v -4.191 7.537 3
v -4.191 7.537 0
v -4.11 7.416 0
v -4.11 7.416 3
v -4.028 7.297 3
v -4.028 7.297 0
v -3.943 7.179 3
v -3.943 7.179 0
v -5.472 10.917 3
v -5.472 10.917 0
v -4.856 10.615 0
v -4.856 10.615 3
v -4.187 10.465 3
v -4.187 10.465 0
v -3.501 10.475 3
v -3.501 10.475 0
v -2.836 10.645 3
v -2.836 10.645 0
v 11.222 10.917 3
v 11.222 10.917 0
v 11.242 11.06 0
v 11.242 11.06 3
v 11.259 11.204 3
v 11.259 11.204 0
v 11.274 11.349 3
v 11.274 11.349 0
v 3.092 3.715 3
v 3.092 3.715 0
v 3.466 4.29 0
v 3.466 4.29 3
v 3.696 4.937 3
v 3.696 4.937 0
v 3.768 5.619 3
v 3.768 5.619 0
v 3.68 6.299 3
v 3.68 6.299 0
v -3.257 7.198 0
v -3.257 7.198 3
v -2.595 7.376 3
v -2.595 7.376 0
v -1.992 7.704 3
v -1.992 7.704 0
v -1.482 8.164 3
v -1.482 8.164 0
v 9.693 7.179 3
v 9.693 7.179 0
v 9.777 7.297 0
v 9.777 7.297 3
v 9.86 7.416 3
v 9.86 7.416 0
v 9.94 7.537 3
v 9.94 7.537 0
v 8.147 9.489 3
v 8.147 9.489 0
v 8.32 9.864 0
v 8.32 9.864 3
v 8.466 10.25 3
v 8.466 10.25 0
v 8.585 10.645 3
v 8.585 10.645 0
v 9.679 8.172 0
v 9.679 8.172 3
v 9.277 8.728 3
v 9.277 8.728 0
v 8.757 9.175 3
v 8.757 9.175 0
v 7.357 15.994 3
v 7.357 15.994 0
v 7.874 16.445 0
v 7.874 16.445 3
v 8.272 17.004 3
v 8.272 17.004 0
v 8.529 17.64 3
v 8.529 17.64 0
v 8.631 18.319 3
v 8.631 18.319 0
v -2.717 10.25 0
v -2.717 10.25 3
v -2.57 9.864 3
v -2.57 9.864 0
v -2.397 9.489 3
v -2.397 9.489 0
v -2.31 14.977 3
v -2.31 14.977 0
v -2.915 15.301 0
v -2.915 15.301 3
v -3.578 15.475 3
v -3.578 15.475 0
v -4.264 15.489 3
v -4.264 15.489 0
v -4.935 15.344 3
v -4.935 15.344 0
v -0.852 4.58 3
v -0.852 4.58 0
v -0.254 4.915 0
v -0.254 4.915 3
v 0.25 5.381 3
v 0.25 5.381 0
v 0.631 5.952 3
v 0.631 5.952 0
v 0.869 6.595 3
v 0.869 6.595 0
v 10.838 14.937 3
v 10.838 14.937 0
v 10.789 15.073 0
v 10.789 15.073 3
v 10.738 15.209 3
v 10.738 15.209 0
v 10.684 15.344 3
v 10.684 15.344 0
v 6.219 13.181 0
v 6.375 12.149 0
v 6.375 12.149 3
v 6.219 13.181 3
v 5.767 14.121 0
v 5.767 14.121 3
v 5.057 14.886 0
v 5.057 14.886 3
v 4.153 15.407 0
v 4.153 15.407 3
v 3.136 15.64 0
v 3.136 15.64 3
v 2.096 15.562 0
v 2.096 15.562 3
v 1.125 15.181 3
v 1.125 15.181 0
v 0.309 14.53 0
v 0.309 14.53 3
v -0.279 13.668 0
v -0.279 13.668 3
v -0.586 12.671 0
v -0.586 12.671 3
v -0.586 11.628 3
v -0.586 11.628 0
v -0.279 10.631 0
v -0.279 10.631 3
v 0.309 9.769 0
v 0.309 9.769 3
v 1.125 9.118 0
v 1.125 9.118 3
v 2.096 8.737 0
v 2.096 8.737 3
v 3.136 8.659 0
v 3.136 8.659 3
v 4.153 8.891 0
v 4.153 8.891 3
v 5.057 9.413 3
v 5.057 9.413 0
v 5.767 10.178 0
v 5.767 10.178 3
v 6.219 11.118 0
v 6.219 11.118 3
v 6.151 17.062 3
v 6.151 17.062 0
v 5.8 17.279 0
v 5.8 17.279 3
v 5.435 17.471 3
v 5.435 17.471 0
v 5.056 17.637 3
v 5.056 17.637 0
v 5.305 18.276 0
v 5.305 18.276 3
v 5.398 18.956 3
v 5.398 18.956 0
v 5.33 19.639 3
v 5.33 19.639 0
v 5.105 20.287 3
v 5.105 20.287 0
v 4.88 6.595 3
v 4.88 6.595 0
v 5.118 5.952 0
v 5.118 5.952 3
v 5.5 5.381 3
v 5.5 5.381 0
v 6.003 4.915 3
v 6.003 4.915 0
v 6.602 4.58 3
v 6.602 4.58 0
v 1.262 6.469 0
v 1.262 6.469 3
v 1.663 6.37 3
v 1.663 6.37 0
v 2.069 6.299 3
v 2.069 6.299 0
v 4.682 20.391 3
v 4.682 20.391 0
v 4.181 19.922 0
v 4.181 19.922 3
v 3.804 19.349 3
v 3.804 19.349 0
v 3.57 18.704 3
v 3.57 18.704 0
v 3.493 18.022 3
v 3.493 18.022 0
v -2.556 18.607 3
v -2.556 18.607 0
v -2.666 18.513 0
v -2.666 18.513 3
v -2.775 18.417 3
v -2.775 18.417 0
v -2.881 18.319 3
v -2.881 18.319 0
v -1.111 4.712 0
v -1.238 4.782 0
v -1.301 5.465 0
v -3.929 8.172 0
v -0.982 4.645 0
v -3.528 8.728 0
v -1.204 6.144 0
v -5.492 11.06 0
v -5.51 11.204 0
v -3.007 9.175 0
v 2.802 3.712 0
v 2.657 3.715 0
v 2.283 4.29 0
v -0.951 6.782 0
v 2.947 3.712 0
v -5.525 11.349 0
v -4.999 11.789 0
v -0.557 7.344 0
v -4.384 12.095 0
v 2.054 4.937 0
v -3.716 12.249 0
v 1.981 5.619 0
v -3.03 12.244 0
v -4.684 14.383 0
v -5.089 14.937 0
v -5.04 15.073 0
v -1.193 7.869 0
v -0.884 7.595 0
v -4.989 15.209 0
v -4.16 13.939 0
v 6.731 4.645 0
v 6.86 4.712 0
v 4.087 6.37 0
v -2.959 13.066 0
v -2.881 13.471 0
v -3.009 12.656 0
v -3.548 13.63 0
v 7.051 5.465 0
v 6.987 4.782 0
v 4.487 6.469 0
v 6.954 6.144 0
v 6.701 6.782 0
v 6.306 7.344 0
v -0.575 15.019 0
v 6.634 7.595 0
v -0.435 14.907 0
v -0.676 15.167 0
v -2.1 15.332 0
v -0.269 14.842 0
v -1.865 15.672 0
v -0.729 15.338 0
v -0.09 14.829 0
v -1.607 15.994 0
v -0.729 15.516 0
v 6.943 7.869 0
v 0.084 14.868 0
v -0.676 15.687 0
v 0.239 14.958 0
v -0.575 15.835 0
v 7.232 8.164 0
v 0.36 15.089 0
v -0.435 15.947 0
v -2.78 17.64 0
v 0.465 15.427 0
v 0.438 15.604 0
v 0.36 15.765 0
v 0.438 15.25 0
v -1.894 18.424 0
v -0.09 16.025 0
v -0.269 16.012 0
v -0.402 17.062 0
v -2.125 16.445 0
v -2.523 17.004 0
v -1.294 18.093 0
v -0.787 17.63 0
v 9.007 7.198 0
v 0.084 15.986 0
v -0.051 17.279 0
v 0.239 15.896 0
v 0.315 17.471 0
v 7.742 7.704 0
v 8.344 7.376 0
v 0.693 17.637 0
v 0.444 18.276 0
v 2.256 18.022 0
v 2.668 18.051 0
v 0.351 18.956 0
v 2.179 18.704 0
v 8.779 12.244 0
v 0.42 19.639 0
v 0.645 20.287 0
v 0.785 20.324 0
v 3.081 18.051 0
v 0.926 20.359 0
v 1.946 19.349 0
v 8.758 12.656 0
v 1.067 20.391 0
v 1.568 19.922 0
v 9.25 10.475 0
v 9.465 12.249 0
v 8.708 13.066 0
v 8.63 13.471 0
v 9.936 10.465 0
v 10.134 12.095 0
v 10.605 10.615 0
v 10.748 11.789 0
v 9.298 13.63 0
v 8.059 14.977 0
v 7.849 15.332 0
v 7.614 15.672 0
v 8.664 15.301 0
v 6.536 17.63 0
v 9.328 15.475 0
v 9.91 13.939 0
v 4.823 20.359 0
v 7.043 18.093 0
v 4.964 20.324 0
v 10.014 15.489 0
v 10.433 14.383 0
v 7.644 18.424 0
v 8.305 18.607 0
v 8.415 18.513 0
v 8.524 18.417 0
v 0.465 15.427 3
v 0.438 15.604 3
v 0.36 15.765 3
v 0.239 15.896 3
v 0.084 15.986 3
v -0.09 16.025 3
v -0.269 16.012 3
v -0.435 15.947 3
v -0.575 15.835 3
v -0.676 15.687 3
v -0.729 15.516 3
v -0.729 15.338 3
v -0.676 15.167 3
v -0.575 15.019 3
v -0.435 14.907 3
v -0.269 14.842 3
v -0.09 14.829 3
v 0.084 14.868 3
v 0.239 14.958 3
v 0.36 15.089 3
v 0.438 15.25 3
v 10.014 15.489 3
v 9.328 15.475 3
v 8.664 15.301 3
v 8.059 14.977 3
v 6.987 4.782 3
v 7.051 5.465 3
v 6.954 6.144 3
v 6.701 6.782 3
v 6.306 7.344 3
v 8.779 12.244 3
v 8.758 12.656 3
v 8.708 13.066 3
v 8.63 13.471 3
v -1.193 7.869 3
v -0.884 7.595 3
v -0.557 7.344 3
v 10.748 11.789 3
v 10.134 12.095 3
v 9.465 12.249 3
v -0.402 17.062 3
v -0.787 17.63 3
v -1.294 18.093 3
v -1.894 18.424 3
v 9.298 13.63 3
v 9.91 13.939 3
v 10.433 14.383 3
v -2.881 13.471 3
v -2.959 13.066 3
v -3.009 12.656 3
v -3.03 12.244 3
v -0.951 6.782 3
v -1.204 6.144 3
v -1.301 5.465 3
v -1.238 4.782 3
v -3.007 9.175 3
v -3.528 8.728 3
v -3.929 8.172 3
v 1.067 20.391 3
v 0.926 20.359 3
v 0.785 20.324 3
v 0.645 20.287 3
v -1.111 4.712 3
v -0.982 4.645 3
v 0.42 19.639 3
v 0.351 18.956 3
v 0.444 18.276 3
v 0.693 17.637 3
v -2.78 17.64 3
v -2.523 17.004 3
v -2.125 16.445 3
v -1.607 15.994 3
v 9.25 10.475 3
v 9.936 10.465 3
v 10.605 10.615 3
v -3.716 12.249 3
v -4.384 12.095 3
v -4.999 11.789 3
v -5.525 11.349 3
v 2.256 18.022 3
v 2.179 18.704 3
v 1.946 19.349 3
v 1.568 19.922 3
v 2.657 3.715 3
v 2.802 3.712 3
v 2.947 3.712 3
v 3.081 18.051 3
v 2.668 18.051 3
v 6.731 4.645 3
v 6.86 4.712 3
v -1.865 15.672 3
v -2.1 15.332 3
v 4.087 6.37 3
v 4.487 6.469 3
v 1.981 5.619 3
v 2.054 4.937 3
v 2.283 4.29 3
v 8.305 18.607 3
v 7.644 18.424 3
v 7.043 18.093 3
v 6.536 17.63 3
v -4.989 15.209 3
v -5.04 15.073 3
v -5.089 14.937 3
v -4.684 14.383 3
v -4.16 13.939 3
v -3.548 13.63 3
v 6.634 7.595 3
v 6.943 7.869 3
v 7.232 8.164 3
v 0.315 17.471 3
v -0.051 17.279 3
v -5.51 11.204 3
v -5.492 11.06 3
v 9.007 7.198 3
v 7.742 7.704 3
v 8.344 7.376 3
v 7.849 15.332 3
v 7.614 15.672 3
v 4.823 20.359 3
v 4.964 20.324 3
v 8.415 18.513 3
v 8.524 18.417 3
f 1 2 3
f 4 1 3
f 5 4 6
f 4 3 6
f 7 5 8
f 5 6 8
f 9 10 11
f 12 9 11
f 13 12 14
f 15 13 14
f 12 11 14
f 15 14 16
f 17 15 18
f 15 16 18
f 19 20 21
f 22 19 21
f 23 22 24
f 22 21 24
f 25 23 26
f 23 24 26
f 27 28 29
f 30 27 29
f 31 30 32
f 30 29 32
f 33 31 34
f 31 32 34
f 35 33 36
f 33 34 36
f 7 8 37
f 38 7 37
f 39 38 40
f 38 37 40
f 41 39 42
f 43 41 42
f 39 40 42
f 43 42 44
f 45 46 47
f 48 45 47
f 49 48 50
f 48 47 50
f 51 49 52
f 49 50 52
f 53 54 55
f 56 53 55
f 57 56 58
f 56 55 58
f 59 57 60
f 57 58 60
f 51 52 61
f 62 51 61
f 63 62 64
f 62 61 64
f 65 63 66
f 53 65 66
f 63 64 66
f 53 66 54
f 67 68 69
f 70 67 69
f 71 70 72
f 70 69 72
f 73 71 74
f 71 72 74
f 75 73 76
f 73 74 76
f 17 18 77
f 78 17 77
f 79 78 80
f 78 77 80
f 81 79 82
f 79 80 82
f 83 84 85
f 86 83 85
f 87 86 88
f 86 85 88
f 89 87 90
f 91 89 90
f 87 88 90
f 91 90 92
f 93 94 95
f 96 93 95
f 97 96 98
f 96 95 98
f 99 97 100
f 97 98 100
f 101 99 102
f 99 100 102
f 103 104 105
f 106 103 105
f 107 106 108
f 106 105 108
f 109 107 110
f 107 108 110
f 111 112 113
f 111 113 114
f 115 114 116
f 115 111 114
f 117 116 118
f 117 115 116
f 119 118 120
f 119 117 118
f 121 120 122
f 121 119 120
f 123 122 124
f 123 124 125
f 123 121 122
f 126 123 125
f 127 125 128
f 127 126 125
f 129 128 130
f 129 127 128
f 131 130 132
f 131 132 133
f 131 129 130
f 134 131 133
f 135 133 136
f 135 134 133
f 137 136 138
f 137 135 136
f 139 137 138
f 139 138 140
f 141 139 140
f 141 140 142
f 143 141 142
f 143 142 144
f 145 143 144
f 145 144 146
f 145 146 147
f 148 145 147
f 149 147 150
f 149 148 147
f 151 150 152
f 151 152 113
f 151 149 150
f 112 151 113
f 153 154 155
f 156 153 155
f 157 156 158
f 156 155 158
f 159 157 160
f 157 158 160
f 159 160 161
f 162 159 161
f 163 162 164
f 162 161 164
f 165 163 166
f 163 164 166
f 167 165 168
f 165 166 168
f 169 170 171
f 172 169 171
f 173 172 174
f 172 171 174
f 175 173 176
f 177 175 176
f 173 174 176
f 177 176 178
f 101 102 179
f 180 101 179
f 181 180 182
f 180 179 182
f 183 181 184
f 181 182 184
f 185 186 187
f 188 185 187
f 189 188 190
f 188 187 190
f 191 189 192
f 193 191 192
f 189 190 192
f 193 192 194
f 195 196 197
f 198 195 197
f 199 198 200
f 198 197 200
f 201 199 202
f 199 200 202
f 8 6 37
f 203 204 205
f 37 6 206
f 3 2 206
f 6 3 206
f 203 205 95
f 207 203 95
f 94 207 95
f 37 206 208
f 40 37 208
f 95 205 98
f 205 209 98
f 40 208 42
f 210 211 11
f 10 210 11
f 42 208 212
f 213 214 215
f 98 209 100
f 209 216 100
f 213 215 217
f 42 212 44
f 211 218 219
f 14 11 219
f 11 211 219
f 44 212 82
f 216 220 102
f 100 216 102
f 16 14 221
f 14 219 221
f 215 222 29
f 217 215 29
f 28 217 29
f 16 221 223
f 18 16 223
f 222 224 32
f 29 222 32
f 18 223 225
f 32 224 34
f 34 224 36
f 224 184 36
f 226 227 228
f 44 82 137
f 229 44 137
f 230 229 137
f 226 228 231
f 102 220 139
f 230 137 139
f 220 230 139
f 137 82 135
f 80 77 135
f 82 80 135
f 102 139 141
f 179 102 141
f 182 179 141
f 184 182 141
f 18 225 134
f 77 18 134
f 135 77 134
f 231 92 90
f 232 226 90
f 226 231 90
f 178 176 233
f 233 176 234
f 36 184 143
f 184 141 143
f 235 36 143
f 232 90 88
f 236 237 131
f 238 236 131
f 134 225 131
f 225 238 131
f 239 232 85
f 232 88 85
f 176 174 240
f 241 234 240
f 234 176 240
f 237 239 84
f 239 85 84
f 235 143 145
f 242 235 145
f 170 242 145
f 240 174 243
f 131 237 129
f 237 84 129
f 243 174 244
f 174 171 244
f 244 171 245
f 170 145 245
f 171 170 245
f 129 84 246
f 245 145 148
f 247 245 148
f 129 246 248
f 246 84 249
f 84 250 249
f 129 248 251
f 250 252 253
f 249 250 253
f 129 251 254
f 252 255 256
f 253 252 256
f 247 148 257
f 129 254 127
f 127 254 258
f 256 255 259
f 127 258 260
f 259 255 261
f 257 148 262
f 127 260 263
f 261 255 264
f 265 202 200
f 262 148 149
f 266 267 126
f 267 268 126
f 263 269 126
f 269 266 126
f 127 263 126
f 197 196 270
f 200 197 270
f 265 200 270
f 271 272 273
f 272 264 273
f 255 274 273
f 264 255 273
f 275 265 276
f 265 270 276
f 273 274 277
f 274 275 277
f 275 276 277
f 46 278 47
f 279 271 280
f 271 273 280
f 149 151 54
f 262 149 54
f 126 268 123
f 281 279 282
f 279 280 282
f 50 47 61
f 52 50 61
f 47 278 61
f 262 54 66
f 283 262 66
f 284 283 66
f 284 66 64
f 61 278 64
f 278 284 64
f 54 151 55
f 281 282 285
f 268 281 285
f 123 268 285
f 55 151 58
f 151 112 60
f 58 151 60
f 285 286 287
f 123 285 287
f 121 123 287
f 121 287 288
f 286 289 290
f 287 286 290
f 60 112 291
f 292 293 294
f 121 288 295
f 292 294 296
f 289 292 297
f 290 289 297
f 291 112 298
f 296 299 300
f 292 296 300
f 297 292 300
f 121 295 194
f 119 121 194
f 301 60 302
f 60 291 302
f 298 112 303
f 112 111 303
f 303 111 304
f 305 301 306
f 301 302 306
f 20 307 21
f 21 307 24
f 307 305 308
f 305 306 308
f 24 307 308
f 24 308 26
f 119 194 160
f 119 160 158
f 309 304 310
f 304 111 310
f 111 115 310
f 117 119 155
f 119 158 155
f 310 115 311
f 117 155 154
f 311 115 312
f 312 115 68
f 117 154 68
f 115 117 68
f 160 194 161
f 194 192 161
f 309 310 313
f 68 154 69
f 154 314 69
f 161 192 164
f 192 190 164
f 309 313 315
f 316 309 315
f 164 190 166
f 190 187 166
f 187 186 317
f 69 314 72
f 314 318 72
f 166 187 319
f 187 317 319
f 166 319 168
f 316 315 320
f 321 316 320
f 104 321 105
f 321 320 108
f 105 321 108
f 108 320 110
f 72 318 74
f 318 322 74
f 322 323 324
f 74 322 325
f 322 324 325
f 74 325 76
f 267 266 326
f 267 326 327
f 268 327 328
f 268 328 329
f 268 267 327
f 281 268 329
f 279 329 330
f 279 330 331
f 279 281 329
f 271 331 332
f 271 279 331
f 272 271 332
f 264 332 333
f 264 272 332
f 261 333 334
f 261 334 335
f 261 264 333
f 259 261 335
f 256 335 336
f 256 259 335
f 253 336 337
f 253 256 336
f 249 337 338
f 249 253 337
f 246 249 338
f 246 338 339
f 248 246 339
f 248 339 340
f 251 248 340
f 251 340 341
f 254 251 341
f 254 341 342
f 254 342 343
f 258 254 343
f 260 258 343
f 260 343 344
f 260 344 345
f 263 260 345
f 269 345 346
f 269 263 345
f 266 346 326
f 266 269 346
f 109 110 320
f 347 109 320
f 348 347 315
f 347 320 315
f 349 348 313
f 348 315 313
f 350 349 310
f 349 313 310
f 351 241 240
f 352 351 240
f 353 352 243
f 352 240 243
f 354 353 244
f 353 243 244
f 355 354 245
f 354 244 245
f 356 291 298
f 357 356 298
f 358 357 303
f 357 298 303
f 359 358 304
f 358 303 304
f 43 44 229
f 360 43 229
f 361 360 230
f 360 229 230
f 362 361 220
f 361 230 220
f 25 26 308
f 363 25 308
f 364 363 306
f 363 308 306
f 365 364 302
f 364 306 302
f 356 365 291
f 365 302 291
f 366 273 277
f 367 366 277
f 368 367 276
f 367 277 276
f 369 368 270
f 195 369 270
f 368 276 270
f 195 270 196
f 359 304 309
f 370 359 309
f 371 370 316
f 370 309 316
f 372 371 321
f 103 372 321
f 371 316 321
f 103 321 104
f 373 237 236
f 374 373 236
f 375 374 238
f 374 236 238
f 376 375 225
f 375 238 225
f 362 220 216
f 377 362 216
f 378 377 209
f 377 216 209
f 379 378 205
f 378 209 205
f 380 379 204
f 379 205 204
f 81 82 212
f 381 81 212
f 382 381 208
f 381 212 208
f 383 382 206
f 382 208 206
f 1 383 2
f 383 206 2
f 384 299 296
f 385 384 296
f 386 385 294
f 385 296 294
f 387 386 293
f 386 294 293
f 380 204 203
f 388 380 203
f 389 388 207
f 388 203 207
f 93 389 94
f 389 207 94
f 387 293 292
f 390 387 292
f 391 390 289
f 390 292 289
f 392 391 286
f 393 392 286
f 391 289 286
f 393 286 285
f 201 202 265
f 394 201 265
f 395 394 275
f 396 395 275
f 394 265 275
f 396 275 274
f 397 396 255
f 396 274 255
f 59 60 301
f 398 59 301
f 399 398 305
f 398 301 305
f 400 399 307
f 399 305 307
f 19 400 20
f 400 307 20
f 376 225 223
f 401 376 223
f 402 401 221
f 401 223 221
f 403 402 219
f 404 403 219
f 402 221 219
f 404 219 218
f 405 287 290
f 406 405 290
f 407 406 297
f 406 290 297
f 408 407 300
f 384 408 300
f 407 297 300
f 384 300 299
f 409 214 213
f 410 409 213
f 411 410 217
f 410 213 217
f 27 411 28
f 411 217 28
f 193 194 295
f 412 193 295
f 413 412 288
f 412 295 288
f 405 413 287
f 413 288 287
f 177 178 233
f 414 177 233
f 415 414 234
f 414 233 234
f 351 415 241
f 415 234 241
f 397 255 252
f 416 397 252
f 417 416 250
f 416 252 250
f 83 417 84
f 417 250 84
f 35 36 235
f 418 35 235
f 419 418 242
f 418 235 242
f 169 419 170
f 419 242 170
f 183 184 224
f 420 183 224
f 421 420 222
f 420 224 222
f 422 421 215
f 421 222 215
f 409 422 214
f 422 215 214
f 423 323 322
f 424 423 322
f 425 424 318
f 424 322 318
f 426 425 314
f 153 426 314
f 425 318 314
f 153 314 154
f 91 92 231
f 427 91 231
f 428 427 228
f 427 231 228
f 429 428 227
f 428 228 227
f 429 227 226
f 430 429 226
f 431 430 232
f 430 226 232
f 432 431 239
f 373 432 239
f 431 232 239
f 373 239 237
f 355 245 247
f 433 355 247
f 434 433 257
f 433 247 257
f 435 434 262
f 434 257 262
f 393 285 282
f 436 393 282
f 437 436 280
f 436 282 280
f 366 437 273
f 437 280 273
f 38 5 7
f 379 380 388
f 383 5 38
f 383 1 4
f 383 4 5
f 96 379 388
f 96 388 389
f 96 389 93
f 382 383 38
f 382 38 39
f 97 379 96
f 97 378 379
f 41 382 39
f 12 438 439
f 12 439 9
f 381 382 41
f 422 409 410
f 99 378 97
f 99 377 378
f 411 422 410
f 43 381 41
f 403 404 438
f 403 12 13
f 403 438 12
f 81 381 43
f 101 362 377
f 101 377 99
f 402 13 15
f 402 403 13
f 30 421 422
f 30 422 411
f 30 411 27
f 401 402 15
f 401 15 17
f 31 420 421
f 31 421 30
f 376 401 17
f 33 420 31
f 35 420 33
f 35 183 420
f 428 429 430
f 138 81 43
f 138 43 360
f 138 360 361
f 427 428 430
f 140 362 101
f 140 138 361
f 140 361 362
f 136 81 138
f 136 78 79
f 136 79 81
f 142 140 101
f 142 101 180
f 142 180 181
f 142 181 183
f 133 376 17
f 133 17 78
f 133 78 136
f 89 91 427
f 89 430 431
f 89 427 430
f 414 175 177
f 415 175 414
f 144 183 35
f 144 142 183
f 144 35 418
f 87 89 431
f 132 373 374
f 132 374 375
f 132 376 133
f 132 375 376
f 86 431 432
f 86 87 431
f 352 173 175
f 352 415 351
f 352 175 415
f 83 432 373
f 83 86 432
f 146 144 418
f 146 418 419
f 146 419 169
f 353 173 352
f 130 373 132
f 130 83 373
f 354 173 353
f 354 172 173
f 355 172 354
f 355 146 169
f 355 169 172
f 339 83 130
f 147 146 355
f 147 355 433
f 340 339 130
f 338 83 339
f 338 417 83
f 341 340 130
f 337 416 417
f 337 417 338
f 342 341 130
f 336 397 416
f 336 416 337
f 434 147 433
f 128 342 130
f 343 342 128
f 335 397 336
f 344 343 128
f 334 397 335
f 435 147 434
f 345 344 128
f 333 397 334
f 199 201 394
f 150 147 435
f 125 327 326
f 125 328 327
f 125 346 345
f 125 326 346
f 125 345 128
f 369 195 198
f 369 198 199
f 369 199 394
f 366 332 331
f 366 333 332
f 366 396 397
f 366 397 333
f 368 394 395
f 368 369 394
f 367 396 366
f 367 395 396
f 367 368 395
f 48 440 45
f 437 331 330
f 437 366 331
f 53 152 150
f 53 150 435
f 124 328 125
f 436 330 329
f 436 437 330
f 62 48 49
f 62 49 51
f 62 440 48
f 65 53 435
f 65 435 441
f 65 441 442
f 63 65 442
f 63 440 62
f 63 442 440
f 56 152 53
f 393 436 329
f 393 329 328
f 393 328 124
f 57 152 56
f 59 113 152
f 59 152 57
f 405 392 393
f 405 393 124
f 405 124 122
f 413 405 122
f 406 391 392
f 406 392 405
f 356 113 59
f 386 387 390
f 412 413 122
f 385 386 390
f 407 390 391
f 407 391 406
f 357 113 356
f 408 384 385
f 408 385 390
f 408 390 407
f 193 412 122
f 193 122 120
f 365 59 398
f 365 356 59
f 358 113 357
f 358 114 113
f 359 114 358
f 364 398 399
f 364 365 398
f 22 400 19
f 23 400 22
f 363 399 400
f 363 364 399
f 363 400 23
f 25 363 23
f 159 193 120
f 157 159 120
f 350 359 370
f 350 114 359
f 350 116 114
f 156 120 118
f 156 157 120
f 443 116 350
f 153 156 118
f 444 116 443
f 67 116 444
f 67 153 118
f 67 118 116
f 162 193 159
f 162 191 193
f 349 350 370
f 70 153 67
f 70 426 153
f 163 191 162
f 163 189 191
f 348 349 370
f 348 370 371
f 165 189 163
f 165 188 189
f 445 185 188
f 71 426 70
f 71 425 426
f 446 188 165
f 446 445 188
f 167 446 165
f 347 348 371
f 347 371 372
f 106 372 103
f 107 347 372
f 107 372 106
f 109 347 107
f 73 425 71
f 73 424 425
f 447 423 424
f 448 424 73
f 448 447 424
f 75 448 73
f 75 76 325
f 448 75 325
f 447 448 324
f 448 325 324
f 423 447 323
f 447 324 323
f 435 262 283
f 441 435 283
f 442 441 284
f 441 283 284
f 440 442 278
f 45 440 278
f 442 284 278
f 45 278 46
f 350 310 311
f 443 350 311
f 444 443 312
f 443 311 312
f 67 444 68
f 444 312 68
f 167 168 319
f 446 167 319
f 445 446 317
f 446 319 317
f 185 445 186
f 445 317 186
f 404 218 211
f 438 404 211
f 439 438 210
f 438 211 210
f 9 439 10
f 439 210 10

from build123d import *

# Parameters (mm, degrees)
SKETCH1_R           = 3.5
SKETCH1_R_2         = 0.6
BOSS_EXTRUDE1_DEPTH = 3


with BuildPart() as part:
    # Sketch1 → Boss-Extrude1 (new body)
    with BuildSketch(Plane.XY):
        with BuildLine():
            ThreePointArc((2.256436303, 18.02221908), (1.945672304, 19.349065897), (1.067466411, 20.391107713))
            ThreePointArc((1.067466411, 20.391107713), (0.855450056, 20.341742586), (0.644777778, 20.286924322))
            ThreePointArc((0.644777778, 20.286924322), (0.351426057, 18.956119489), (0.692874662, 17.636835748))
            ThreePointArc((0.692874662, 17.636835748), (0.130369461, 17.378260197), (-0.40197342, 17.062215148))
            ThreePointArc((-0.40197342, 17.062215148), (-1.293757737, 18.092660425), (-2.555631415, 18.607220002))
            ThreePointArc((-2.555631415, 18.607220002), (-2.720421456, 18.464980439), (-2.881487176, 18.318536988))
            ThreePointArc((-2.881487176, 18.318536988), (-2.522781382, 17.003840487), (-1.607341932, 15.994351828))
            ThreePointArc((-1.607341932, 15.994351828), (-1.985249501, 15.503985347), (-2.309742255, 14.976749281))
            ThreePointArc((-2.309742255, 14.976749281), (-3.57824985, 15.474730425), (-4.93471126, 15.343928364))
            ThreePointArc((-4.93471126, 15.343928364), (-5.014523575, 15.141399736), (-5.089084522, 14.936879527))
            ThreePointArc((-5.089084522, 14.936879527), (-4.160496386, 13.939472483), (-2.880782238, 13.471040593))
            ThreePointArc((-2.880782238, 13.471040593), (-2.987518106, 12.861220233), (-3.029823353, 12.243576579))
            ThreePointArc((-3.029823353, 12.243576579), (-4.384454423, 12.09501211), (-5.524754604, 11.348813588))
            ThreePointArc((-5.524754604, 11.348813588), (-5.501305152, 11.132392762), (-5.472280312, 10.916648911))
            ThreePointArc((-5.472280312, 10.916648911), (-4.186538186, 10.465025257), (-2.835716429, 10.644962236))
            ThreePointArc((-2.835716429, 10.644962236), (-2.646828694, 10.055390493), (-2.397254812, 9.488833969))
            ThreePointArc((-2.397254812, 9.488833969), (-3.527679704, 8.727758217), (-4.190589627, 7.537108322))
            ThreePointArc((-4.190589627, 7.537108322), (-4.069250395, 7.356374701), (-3.943289009, 7.178831524))
            ThreePointArc((-3.943289009, 7.178831524), (-2.594940919, 7.376452797), (-1.482468538, 8.163537251))
            ThreePointArc((-1.482468538, 8.163537251), (-1.041229104, 7.729277906), (-0.556950462, 7.343599785))
            ThreePointArc((-0.556950462, 7.343599785), (-1.204202457, 6.144366032), (-1.237857446, 4.782028306))
            ThreePointArc((-1.237857446, 4.782028306), (-1.046425791, 4.678385785), (-0.852384094, 4.579716284))
            ThreePointArc((-0.852384094, 4.579716284), (0.249679662, 5.381309833), (0.868948651, 6.595230199))
            ThreePointArc((0.868948651, 6.595230199), (1.461457147, 6.415766834), (2.069498148, 6.299321325))
            ThreePointArc((2.069498148, 6.299321325), (2.053696683, 4.936659572), (2.657006579, 3.714729171))
            ThreePointArc((2.657006579, 3.714729171), (2.874675973, 3.711921002), (3.092345367, 3.714729171))
            ThreePointArc((3.092345367, 3.714729171), (3.695655263, 4.936659572), (3.679853798, 6.299321325))
            ThreePointArc((3.679853798, 6.299321325), (4.2878948, 6.415766834), (4.880403295, 6.595230199))
            ThreePointArc((4.880403295, 6.595230199), (5.499672285, 5.381309833), (6.60173604, 4.579716284))
            ThreePointArc((6.60173604, 4.579716284), (6.795777737, 4.678385785), (6.987209392, 4.782028306))
            ThreePointArc((6.987209392, 4.782028306), (6.953554403, 6.144366032), (6.306302409, 7.343599785))
            ThreePointArc((6.306302409, 7.343599785), (6.790581051, 7.729277906), (7.231820484, 8.163537251))
            ThreePointArc((7.231820484, 8.163537251), (8.344292866, 7.376452797), (9.692640955, 7.178831524))
            ThreePointArc((9.692640955, 7.178831524), (9.818602342, 7.356374701), (9.939941573, 7.537108322))
            ThreePointArc((9.939941573, 7.537108322), (9.27703165, 8.727758217), (8.146606758, 9.488833969))
            ThreePointArc((8.146606758, 9.488833969), (8.39618064, 10.055390493), (8.585068375, 10.644962236))
            ThreePointArc((8.585068375, 10.644962236), (9.935890133, 10.465025257), (11.221632258, 10.916648911))
            ThreePointArc((11.221632258, 10.916648911), (11.250657098, 11.132392762), (11.27410655, 11.348813588))
            ThreePointArc((11.27410655, 11.348813588), (10.133806369, 12.09501211), (8.779175299, 12.243576579))
            ThreePointArc((8.779175299, 12.243576579), (8.736870052, 12.861220233), (8.630134184, 13.471040593))
            ThreePointArc((8.630134184, 13.471040593), (9.909848333, 13.939472483), (10.838436468, 14.936879527))
            ThreePointArc((10.838436468, 14.936879527), (10.763875521, 15.141399736), (10.684063206, 15.343928364))
            ThreePointArc((10.684063206, 15.343928364), (9.327601796, 15.474730425), (8.059094201, 14.976749281))
            ThreePointArc((8.059094201, 14.976749281), (7.734601447, 15.503985347), (7.356693878, 15.994351828))
            ThreePointArc((7.356693878, 15.994351828), (8.272133328, 17.003840487), (8.630839122, 18.318536988))
            ThreePointArc((8.630839122, 18.318536988), (8.469773402, 18.464980439), (8.304983361, 18.607220002))
            ThreePointArc((8.304983361, 18.607220002), (7.043109683, 18.092660425), (6.151325366, 17.062215148))
            ThreePointArc((6.151325366, 17.062215148), (5.618982485, 17.378260197), (5.056477284, 17.636835748))
            ThreePointArc((5.056477284, 17.636835748), (5.39792589, 18.956119489), (5.104574168, 20.286924322))
            ThreePointArc((5.104574168, 20.286924322), (4.893901891, 20.341742586), (4.681885535, 20.391107713))
            ThreePointArc((4.681885535, 20.391107713), (3.803679642, 19.349065897), (3.492915643, 18.02221908))
            ThreePointArc((3.492915643, 18.02221908), (2.874675973, 18.054671002), (2.256436303, 18.02221908))
        make_face()
        with Locations((2.874675973, 12.149421002)):
            Circle(SKETCH1_R, mode=Mode.SUBTRACT)
        with Locations((-0.135327396, 15.426977975)):
            Circle(SKETCH1_R_2, mode=Mode.SUBTRACT)
    extrude(amount=BOSS_EXTRUDE1_DEPTH)


solid = part.part
